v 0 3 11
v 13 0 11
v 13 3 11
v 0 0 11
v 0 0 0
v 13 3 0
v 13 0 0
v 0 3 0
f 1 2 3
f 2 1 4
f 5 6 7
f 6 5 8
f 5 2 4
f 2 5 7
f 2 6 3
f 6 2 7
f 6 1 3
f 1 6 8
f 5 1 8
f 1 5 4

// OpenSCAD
// Generated by SolidPython 1.0.1 on 2020-07-29 00:46:55


cube(size = [13, 3, 11]);
/***********************************************
*********      SolidPython code:      **********
************************************************
 
# import packages: SolidPython
from solid import *
from solid.utils import *
from itertools import chain, combinations, permutations


class Resize:

    def __init__(self, scad_file):
        self.scad_file = scad_file
        #self.scad_file = import_scad(scad_file)
        # cone/cylinder param:
        self.r1 = 0
        self.r2 = 0
        self.h = 0
        # rectangular prism param:
        self.w = 0
        self.l = 0
        # ellipse param:
        self.r = 0

    # import OpenScad code (file name corresponds to shape)


    # classify shape + parameters
    def assign(self, param1, param2, param3):
        if self.scad_file == 'cone.scad':
            self.r1 = param1
            self.r2 = param2
            self.h = param3
        elif self.scad_file == 'cylinder.scad':
            self.r1 = param1
            self.r2 = param2
            self.h = param3
        elif self.scad_file == 'rectangularPrism.scad':
            self.h = param1
            self.l = param2
            self.w = param3
        else:
            self.r = param1
            self.h = param2

    # resize parameters
    def iterate(self):
        x = range(3, 20, 2)
        i = 1
        if self.scad_file == 'cone.scad':
            tempList = list(permutations(x, 2))
            for temp in tempList:
                param1 = temp[0]
                param2 = temp[1]
                filepath = 'produced_scad_files/' + 'cone' + str(param1) + '_' + str(param2) + '_' + '.scad'
                scad_render_to_file(cylinder(h=param1, r1=param2, r2=0), filepath)

        elif self.scad_file == 'cylinder.scad':
            tempList = list(permutations(x, 3))
            for temp in tempList:
                param1 = temp[0]
                param2 = temp[1]
                filepath = 'produced_scad_files/' + 'cylinder' + str(param1) + '_' + str(param2) + '_' + '.scad'
                scad_render_to_file(cylinder(h=param1, r1=param2, r2=param2), filepath)

        elif self.scad_file == 'rectangularPrism.scad':
            tempList = list(permutations(x, 3))
            for temp in tempList:
                param1 = temp[0]
                param2 = temp[1]
                param3 = temp[2]
                filepath = 'produced_scad_files/' + 'rectangularPrism' + str(param1) + '_' + str(param2) + '_' + str(
                    param3) + '.scad'
                scad_render_to_file(cube(size=(param1, param2, param3)), filepath)

        elif self.scad_file == 'ellipse.scad':
            tempList = list(permutations(x, 4))
            for temp in tempList:
                param1 = temp[0]
                param2 = temp[1]
                param3 = temp[2]
                param4 = temp[3]
                filepath = 'produced_scad_files/' + 'ellipse' + str(param1) + '_' + str(param2) + '_' + str(param3) + '_' + str(param4) + '.scad'
                scad_render_to_file(scale([param1, param2, param3])(sphere(r=param4)), filepath)

    def render_to_scadfile(self):
        scad_render_to_file(scad, 'example.scad') 
 
************************************************/
